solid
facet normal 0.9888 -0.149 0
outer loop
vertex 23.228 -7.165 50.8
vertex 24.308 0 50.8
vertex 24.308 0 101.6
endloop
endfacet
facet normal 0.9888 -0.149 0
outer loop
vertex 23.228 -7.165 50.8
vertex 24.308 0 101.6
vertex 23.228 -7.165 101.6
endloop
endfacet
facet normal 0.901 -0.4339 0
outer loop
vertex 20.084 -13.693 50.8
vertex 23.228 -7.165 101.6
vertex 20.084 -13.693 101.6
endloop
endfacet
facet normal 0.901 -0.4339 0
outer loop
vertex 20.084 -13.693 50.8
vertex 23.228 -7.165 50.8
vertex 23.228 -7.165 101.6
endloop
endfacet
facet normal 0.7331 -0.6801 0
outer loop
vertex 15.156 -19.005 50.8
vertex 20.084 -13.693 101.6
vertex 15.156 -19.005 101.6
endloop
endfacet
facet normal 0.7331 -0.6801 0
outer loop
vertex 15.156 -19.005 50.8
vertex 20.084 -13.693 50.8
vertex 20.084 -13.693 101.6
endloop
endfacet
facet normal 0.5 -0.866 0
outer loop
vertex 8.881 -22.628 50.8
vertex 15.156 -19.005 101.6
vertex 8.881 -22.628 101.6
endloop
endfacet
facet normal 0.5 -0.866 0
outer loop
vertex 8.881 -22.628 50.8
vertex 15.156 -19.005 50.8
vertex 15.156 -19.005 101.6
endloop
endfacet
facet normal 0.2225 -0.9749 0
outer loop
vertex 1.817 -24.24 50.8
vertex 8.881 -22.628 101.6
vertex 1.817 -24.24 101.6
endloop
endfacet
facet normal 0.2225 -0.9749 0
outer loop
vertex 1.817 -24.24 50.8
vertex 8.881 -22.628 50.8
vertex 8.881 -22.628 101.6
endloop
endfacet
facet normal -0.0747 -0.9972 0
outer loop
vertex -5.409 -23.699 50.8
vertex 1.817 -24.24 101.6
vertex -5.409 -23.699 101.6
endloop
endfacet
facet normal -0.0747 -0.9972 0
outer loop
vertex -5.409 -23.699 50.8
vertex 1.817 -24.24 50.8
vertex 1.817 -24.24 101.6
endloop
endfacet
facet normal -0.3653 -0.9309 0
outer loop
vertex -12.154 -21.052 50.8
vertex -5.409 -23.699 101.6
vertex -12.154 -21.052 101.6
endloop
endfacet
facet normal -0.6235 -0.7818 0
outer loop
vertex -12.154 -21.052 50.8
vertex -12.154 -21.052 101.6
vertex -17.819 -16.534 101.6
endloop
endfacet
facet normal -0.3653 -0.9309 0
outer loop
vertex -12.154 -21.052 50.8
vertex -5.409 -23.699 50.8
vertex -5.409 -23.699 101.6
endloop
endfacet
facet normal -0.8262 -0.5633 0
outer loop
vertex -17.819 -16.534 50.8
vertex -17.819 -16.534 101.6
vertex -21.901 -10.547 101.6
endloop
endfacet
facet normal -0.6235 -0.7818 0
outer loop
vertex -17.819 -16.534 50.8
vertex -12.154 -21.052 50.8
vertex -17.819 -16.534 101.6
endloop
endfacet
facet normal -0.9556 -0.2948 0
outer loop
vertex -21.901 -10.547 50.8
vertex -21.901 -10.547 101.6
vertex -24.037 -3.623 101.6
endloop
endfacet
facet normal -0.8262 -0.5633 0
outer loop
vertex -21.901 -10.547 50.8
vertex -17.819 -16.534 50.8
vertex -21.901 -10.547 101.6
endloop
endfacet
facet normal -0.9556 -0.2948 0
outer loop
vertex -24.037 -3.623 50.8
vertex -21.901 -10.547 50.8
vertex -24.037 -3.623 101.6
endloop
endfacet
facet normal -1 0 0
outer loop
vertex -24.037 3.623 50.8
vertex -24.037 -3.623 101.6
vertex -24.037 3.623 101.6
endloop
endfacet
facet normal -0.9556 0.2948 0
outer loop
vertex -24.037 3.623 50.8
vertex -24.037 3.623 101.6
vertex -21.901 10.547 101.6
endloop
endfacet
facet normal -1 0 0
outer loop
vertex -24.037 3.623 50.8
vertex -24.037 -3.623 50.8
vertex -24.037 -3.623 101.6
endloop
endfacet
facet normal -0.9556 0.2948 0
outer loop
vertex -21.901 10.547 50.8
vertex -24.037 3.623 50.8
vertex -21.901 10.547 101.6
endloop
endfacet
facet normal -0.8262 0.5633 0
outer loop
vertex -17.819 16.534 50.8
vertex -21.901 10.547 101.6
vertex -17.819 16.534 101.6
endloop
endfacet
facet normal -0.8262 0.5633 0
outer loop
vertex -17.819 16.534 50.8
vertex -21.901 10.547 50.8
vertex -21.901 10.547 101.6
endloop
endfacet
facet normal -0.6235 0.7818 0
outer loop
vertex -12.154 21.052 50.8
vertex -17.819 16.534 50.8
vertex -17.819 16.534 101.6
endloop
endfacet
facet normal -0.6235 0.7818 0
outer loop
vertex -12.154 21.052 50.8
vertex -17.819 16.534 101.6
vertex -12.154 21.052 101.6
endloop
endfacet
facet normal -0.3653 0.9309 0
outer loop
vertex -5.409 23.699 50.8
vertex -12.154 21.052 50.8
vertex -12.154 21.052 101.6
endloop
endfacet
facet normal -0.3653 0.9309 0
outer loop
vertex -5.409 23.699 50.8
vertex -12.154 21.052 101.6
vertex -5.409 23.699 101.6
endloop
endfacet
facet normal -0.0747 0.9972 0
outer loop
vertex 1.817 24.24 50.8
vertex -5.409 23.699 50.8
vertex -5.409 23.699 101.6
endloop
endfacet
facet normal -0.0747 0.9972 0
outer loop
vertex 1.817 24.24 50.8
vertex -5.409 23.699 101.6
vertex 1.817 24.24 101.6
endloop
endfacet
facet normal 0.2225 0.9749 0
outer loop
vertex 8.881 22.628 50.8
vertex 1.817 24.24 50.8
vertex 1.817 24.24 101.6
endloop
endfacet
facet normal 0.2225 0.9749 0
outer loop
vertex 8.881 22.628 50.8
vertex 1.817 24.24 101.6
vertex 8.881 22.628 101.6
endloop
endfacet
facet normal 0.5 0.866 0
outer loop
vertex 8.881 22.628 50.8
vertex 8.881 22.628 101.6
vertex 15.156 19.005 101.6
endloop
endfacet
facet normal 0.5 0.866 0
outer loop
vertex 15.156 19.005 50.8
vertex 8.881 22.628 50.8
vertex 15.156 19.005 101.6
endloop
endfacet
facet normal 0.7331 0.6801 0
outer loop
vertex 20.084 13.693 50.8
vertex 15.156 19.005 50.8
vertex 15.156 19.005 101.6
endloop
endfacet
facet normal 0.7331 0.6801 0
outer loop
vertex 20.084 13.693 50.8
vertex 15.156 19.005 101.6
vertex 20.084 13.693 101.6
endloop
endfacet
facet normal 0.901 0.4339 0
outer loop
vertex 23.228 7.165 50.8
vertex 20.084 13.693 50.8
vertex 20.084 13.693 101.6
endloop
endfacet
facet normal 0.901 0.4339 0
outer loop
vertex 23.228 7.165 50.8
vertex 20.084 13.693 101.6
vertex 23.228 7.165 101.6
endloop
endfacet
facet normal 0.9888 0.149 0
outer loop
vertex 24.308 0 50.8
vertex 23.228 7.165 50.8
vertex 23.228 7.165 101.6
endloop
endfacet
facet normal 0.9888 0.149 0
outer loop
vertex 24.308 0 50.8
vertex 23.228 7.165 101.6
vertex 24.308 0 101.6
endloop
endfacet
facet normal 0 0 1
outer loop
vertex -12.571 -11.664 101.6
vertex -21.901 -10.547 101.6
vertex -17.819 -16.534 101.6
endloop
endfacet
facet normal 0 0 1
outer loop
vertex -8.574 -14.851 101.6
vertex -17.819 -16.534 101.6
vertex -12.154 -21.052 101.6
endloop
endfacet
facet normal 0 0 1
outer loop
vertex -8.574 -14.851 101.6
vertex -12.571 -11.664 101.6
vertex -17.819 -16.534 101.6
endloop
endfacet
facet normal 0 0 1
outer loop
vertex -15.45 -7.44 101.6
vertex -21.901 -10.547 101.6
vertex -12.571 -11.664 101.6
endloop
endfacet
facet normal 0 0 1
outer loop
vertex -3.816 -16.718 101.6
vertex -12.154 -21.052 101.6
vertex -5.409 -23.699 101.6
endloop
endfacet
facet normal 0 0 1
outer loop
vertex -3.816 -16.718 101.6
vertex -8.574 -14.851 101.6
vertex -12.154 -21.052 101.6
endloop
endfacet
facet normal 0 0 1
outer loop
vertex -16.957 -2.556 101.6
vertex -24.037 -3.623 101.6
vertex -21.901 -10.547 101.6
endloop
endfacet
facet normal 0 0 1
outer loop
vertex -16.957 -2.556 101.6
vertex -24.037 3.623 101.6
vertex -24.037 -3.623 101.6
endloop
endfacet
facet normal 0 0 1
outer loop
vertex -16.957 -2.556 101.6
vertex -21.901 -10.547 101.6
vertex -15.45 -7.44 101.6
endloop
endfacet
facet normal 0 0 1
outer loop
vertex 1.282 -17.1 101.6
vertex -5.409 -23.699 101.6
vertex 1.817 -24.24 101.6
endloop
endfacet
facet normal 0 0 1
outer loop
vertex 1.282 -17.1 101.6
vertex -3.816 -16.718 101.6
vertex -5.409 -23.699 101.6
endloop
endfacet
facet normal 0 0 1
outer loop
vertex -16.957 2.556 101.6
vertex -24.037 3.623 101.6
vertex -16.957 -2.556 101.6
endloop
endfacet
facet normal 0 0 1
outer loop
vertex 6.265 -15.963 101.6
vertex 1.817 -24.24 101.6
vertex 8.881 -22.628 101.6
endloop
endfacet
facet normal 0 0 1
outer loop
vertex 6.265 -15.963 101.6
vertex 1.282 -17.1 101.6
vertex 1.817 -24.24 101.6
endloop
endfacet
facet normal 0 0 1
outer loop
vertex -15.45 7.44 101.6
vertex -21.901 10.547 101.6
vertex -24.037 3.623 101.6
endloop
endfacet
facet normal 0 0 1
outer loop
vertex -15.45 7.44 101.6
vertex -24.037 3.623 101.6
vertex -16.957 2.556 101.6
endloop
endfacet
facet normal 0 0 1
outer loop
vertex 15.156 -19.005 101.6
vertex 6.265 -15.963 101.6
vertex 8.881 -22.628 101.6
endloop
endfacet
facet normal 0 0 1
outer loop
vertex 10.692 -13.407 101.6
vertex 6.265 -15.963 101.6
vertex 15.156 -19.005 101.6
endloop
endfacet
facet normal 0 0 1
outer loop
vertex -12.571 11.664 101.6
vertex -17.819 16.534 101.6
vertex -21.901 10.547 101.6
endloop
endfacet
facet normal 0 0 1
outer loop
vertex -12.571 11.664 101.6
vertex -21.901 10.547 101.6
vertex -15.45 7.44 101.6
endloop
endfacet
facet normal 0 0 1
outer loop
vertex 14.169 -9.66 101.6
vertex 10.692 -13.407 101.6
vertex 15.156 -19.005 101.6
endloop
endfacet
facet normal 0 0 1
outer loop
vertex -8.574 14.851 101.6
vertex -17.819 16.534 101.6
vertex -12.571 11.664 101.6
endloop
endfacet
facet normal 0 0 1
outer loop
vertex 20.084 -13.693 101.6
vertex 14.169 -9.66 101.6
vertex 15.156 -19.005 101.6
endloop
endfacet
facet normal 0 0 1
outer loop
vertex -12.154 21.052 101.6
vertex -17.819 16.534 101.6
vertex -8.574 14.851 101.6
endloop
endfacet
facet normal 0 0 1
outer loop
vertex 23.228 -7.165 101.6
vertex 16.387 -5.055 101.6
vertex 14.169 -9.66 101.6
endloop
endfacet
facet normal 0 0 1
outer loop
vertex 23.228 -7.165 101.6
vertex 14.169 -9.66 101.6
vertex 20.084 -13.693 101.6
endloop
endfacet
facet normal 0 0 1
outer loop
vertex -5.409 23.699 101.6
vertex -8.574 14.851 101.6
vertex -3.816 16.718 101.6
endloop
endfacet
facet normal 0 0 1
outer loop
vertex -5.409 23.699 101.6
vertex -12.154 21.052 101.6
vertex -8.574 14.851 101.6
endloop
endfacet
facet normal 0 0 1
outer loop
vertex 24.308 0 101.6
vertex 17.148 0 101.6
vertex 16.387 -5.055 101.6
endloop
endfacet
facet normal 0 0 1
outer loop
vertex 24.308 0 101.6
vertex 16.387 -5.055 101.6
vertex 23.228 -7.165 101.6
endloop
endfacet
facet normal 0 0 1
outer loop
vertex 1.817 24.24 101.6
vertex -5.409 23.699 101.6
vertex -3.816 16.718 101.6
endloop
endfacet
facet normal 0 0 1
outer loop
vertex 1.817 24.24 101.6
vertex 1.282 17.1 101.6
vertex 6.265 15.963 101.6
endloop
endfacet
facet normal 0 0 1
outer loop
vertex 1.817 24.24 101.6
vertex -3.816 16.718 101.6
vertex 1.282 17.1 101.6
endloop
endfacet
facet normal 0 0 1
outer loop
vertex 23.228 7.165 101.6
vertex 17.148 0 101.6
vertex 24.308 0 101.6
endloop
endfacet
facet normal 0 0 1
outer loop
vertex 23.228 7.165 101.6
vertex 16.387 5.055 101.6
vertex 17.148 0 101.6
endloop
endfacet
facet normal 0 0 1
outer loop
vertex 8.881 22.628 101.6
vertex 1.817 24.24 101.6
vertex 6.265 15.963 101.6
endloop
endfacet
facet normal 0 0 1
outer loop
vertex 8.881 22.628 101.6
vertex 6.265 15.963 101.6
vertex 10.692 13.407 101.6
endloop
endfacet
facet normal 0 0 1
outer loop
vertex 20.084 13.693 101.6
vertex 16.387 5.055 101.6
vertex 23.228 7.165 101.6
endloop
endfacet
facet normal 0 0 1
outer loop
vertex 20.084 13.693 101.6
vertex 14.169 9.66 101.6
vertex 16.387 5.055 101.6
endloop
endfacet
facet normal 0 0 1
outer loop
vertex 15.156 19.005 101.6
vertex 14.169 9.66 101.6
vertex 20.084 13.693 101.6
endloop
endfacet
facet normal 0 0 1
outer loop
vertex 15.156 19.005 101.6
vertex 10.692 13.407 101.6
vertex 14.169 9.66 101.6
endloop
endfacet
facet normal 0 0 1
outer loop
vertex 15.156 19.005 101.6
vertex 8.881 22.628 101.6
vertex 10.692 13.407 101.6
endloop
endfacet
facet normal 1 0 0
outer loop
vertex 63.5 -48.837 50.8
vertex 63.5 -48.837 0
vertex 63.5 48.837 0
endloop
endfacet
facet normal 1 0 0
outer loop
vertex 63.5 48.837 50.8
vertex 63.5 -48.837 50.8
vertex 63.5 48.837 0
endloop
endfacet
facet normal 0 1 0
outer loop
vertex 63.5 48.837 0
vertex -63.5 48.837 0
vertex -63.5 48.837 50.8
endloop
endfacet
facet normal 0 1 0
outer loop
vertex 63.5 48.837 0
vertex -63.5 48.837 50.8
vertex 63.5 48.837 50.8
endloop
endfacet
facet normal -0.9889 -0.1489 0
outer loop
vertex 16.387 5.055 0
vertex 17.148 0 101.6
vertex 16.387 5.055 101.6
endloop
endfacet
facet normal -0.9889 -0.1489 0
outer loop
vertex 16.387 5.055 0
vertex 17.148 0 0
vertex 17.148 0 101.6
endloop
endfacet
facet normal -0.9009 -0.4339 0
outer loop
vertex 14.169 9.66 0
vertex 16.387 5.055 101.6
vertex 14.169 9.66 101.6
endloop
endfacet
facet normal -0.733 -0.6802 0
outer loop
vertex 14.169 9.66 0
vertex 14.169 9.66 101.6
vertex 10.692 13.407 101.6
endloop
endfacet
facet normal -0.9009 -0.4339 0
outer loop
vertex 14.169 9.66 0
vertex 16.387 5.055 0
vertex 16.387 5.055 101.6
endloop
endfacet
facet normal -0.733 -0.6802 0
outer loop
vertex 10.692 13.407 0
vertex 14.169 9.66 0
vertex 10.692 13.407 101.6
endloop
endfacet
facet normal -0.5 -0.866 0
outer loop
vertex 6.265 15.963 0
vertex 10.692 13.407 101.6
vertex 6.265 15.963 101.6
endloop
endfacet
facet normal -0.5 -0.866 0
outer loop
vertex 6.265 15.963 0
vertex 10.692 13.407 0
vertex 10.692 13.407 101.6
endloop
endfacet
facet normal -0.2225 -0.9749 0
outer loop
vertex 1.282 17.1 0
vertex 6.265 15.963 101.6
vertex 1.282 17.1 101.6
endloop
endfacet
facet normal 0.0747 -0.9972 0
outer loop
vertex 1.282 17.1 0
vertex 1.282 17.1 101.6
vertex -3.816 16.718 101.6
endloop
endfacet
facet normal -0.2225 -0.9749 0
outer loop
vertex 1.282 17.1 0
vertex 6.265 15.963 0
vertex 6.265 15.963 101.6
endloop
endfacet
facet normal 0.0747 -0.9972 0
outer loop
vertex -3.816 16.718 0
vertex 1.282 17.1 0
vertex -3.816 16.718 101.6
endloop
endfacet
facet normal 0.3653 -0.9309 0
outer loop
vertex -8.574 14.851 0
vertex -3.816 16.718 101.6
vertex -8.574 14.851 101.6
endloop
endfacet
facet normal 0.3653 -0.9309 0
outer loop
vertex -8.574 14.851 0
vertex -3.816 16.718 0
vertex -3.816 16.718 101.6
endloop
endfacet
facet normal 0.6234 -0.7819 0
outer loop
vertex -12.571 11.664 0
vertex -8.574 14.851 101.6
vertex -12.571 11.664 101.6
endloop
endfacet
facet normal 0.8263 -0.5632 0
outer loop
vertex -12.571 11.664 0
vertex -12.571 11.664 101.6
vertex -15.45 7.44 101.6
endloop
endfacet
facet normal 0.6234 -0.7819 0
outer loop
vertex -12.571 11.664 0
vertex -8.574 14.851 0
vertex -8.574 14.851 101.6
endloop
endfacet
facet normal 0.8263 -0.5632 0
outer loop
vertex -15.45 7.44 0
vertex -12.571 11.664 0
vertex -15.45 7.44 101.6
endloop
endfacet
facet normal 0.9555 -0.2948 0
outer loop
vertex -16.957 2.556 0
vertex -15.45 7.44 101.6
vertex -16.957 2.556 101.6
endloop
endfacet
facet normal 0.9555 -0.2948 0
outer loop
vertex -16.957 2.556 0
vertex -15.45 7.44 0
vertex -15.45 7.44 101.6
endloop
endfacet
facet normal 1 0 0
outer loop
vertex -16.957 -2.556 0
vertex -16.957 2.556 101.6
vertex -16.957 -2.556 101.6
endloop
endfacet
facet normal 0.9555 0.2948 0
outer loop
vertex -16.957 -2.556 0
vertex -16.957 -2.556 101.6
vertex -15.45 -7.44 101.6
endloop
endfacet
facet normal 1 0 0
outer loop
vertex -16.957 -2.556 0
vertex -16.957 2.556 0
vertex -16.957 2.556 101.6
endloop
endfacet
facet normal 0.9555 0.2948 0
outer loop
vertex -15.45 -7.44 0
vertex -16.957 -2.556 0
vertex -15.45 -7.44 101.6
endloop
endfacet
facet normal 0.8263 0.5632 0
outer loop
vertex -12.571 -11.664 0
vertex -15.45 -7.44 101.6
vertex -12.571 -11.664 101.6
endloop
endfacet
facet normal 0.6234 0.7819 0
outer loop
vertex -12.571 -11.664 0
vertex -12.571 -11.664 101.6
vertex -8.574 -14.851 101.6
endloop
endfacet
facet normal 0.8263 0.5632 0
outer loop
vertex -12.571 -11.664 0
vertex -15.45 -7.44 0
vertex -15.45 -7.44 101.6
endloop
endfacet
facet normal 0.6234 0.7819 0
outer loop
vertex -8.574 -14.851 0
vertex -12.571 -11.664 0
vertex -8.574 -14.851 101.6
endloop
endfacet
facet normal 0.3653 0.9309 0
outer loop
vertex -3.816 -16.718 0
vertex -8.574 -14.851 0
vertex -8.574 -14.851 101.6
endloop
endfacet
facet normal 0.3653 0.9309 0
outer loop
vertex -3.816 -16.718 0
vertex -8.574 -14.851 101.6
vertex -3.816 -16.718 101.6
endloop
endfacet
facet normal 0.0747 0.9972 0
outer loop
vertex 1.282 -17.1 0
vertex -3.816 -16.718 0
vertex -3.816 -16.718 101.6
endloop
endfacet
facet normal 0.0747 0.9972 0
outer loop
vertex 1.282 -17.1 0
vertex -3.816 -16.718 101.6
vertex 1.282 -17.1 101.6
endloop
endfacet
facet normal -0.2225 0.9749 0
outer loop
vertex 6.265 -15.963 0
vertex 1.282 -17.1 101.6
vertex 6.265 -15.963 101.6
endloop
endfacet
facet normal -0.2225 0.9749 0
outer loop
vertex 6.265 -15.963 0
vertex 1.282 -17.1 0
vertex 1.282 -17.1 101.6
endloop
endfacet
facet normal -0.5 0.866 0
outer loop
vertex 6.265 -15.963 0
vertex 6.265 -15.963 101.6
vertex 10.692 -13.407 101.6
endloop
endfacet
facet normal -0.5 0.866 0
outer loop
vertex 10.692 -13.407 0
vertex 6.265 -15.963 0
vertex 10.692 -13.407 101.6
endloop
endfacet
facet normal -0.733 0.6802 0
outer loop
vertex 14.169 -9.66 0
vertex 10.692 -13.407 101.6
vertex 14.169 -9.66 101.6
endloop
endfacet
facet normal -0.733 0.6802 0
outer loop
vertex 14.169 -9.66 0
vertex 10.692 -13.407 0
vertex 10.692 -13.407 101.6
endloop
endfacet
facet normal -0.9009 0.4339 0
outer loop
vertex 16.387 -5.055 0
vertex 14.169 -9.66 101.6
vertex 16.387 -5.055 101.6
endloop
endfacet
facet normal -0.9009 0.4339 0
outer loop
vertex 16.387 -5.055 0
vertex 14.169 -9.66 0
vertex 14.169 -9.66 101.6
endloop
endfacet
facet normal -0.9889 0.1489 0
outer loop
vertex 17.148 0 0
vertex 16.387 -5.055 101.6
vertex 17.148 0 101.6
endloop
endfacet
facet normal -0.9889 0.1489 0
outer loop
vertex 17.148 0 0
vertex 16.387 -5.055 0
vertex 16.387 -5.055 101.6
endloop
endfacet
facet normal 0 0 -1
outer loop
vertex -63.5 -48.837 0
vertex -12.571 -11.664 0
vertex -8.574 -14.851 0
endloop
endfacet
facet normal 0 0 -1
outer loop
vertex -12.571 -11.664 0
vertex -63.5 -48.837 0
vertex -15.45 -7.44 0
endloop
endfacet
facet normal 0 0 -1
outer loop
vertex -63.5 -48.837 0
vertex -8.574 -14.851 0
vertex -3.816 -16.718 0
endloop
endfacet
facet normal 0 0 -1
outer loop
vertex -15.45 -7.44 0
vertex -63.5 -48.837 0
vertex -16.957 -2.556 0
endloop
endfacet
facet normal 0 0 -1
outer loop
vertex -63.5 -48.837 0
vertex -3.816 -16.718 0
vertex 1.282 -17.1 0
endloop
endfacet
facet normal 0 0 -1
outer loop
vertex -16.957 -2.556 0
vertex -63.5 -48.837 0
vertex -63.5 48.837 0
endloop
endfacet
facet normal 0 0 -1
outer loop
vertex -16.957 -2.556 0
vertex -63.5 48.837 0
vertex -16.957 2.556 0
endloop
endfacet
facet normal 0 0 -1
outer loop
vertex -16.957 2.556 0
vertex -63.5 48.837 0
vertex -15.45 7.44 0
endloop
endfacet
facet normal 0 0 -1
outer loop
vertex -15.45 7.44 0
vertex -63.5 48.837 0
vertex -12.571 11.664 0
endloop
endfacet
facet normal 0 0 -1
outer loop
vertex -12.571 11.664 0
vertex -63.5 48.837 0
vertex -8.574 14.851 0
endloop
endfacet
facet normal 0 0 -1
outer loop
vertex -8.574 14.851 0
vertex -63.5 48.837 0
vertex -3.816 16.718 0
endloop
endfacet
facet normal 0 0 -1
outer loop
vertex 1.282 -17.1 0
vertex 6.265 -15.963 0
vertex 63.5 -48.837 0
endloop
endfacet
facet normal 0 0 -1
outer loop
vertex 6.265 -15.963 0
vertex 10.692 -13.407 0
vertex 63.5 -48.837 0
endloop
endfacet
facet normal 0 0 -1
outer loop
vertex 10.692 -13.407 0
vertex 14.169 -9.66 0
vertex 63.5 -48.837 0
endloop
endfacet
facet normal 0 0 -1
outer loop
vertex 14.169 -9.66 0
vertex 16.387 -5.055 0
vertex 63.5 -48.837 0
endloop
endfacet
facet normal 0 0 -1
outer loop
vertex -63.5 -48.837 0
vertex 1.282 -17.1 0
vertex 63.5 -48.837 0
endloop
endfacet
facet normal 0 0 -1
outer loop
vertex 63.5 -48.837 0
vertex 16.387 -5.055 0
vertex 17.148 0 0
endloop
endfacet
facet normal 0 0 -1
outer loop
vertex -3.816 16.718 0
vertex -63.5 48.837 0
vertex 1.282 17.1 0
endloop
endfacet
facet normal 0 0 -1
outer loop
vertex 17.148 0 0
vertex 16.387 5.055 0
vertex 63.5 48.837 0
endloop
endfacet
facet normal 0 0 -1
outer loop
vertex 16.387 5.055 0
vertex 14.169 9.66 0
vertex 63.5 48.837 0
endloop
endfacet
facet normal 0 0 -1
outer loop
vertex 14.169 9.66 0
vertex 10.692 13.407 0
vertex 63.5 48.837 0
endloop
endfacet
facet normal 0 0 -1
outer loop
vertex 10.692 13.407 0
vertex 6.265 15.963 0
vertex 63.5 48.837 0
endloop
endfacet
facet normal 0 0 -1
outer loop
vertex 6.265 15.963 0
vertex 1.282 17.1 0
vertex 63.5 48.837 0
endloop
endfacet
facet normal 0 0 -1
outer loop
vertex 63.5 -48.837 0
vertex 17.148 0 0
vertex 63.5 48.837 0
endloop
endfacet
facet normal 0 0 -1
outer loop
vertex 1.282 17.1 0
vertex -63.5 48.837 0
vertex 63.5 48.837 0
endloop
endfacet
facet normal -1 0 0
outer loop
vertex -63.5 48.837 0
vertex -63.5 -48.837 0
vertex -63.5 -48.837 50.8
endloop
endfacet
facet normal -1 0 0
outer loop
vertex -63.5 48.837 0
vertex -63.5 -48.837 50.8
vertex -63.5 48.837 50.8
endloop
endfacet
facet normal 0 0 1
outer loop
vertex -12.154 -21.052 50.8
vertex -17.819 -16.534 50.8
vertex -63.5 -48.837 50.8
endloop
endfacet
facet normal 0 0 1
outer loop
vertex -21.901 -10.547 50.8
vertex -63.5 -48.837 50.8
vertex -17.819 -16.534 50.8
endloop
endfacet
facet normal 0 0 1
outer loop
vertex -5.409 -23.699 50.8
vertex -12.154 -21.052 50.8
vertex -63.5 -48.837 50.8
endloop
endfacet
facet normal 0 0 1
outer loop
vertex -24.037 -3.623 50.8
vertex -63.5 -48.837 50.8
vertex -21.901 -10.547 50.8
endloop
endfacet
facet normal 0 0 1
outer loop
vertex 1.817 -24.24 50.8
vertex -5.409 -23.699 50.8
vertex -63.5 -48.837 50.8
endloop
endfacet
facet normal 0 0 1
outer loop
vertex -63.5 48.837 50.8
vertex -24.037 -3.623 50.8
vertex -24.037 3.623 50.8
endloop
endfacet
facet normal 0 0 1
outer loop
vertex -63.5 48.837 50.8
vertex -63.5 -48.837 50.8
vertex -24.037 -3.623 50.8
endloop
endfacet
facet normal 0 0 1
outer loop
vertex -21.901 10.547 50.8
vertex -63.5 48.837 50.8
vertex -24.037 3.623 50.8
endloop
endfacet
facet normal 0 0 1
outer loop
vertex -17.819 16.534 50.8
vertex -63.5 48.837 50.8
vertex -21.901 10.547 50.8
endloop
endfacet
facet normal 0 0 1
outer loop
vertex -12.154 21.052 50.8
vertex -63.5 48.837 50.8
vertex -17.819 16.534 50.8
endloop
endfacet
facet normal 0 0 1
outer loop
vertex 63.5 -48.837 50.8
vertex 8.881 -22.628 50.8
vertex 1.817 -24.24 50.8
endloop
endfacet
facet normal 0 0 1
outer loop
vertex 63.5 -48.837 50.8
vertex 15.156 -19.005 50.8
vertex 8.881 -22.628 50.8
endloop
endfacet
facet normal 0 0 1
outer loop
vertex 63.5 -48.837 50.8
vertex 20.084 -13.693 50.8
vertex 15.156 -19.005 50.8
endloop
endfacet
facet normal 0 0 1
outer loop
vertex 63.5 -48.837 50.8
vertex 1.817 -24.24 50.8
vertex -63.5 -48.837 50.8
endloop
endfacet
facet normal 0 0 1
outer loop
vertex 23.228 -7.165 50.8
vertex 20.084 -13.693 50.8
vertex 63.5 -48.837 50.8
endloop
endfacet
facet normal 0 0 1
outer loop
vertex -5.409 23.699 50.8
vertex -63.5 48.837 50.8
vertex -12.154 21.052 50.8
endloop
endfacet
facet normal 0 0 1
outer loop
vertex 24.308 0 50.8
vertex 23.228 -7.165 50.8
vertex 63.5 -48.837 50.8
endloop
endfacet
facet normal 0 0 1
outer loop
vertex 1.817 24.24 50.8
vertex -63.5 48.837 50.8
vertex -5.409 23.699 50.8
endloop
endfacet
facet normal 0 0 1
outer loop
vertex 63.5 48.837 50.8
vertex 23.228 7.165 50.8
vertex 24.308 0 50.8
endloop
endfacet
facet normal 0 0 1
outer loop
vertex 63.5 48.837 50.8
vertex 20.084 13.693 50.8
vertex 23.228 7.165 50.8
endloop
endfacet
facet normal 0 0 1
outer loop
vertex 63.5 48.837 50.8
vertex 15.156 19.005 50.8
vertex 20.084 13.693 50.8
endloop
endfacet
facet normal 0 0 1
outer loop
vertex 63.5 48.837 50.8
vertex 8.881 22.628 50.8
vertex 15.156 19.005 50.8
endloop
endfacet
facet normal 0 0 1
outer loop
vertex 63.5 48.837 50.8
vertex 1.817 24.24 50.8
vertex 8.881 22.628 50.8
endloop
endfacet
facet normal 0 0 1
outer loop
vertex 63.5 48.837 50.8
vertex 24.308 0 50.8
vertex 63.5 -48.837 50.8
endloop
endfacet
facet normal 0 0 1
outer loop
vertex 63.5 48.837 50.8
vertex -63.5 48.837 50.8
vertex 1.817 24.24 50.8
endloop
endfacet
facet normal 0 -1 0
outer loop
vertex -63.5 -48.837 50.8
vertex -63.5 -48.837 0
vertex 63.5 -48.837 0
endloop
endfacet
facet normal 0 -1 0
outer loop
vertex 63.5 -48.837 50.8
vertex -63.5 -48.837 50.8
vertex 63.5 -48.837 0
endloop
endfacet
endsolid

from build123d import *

# Parameters (mm, degrees)
F0_W     = 127.0000040531
F0_H     = 97.6745411754
F0_R     = 24.3083232654
F0_R_2   = 17.1484022814
F1_DEPTH = 25.4
F2_DEPTH = 50.8
F3_DEPTH = 76.2


with BuildPart() as f1:
    # F0 (on Top) → F1 (new body)
    with BuildSketch(Plane.XY):
        Rectangle(F0_W, F0_H)
        Circle(F0_R, mode=Mode.SUBTRACT)
        Circle(F0_R)
        Circle(F0_R_2, mode=Mode.SUBTRACT)
    extrude(amount=F1_DEPTH)

    # F0 (on Top) → F2 (join)
    with BuildSketch(Plane.XY):
        Rectangle(F0_W, F0_H)
        Circle(F0_R, mode=Mode.SUBTRACT)
    extrude(amount=F2_DEPTH)

    # F3 (add): a face of the model
    f3_faces = [f1.faces().sort_by_distance(p)[0] for p in [
        (-23.6207800566, 0, 25.4),
    ]]
    extrude(f3_faces, amount=F3_DEPTH)


solid = f1.part
